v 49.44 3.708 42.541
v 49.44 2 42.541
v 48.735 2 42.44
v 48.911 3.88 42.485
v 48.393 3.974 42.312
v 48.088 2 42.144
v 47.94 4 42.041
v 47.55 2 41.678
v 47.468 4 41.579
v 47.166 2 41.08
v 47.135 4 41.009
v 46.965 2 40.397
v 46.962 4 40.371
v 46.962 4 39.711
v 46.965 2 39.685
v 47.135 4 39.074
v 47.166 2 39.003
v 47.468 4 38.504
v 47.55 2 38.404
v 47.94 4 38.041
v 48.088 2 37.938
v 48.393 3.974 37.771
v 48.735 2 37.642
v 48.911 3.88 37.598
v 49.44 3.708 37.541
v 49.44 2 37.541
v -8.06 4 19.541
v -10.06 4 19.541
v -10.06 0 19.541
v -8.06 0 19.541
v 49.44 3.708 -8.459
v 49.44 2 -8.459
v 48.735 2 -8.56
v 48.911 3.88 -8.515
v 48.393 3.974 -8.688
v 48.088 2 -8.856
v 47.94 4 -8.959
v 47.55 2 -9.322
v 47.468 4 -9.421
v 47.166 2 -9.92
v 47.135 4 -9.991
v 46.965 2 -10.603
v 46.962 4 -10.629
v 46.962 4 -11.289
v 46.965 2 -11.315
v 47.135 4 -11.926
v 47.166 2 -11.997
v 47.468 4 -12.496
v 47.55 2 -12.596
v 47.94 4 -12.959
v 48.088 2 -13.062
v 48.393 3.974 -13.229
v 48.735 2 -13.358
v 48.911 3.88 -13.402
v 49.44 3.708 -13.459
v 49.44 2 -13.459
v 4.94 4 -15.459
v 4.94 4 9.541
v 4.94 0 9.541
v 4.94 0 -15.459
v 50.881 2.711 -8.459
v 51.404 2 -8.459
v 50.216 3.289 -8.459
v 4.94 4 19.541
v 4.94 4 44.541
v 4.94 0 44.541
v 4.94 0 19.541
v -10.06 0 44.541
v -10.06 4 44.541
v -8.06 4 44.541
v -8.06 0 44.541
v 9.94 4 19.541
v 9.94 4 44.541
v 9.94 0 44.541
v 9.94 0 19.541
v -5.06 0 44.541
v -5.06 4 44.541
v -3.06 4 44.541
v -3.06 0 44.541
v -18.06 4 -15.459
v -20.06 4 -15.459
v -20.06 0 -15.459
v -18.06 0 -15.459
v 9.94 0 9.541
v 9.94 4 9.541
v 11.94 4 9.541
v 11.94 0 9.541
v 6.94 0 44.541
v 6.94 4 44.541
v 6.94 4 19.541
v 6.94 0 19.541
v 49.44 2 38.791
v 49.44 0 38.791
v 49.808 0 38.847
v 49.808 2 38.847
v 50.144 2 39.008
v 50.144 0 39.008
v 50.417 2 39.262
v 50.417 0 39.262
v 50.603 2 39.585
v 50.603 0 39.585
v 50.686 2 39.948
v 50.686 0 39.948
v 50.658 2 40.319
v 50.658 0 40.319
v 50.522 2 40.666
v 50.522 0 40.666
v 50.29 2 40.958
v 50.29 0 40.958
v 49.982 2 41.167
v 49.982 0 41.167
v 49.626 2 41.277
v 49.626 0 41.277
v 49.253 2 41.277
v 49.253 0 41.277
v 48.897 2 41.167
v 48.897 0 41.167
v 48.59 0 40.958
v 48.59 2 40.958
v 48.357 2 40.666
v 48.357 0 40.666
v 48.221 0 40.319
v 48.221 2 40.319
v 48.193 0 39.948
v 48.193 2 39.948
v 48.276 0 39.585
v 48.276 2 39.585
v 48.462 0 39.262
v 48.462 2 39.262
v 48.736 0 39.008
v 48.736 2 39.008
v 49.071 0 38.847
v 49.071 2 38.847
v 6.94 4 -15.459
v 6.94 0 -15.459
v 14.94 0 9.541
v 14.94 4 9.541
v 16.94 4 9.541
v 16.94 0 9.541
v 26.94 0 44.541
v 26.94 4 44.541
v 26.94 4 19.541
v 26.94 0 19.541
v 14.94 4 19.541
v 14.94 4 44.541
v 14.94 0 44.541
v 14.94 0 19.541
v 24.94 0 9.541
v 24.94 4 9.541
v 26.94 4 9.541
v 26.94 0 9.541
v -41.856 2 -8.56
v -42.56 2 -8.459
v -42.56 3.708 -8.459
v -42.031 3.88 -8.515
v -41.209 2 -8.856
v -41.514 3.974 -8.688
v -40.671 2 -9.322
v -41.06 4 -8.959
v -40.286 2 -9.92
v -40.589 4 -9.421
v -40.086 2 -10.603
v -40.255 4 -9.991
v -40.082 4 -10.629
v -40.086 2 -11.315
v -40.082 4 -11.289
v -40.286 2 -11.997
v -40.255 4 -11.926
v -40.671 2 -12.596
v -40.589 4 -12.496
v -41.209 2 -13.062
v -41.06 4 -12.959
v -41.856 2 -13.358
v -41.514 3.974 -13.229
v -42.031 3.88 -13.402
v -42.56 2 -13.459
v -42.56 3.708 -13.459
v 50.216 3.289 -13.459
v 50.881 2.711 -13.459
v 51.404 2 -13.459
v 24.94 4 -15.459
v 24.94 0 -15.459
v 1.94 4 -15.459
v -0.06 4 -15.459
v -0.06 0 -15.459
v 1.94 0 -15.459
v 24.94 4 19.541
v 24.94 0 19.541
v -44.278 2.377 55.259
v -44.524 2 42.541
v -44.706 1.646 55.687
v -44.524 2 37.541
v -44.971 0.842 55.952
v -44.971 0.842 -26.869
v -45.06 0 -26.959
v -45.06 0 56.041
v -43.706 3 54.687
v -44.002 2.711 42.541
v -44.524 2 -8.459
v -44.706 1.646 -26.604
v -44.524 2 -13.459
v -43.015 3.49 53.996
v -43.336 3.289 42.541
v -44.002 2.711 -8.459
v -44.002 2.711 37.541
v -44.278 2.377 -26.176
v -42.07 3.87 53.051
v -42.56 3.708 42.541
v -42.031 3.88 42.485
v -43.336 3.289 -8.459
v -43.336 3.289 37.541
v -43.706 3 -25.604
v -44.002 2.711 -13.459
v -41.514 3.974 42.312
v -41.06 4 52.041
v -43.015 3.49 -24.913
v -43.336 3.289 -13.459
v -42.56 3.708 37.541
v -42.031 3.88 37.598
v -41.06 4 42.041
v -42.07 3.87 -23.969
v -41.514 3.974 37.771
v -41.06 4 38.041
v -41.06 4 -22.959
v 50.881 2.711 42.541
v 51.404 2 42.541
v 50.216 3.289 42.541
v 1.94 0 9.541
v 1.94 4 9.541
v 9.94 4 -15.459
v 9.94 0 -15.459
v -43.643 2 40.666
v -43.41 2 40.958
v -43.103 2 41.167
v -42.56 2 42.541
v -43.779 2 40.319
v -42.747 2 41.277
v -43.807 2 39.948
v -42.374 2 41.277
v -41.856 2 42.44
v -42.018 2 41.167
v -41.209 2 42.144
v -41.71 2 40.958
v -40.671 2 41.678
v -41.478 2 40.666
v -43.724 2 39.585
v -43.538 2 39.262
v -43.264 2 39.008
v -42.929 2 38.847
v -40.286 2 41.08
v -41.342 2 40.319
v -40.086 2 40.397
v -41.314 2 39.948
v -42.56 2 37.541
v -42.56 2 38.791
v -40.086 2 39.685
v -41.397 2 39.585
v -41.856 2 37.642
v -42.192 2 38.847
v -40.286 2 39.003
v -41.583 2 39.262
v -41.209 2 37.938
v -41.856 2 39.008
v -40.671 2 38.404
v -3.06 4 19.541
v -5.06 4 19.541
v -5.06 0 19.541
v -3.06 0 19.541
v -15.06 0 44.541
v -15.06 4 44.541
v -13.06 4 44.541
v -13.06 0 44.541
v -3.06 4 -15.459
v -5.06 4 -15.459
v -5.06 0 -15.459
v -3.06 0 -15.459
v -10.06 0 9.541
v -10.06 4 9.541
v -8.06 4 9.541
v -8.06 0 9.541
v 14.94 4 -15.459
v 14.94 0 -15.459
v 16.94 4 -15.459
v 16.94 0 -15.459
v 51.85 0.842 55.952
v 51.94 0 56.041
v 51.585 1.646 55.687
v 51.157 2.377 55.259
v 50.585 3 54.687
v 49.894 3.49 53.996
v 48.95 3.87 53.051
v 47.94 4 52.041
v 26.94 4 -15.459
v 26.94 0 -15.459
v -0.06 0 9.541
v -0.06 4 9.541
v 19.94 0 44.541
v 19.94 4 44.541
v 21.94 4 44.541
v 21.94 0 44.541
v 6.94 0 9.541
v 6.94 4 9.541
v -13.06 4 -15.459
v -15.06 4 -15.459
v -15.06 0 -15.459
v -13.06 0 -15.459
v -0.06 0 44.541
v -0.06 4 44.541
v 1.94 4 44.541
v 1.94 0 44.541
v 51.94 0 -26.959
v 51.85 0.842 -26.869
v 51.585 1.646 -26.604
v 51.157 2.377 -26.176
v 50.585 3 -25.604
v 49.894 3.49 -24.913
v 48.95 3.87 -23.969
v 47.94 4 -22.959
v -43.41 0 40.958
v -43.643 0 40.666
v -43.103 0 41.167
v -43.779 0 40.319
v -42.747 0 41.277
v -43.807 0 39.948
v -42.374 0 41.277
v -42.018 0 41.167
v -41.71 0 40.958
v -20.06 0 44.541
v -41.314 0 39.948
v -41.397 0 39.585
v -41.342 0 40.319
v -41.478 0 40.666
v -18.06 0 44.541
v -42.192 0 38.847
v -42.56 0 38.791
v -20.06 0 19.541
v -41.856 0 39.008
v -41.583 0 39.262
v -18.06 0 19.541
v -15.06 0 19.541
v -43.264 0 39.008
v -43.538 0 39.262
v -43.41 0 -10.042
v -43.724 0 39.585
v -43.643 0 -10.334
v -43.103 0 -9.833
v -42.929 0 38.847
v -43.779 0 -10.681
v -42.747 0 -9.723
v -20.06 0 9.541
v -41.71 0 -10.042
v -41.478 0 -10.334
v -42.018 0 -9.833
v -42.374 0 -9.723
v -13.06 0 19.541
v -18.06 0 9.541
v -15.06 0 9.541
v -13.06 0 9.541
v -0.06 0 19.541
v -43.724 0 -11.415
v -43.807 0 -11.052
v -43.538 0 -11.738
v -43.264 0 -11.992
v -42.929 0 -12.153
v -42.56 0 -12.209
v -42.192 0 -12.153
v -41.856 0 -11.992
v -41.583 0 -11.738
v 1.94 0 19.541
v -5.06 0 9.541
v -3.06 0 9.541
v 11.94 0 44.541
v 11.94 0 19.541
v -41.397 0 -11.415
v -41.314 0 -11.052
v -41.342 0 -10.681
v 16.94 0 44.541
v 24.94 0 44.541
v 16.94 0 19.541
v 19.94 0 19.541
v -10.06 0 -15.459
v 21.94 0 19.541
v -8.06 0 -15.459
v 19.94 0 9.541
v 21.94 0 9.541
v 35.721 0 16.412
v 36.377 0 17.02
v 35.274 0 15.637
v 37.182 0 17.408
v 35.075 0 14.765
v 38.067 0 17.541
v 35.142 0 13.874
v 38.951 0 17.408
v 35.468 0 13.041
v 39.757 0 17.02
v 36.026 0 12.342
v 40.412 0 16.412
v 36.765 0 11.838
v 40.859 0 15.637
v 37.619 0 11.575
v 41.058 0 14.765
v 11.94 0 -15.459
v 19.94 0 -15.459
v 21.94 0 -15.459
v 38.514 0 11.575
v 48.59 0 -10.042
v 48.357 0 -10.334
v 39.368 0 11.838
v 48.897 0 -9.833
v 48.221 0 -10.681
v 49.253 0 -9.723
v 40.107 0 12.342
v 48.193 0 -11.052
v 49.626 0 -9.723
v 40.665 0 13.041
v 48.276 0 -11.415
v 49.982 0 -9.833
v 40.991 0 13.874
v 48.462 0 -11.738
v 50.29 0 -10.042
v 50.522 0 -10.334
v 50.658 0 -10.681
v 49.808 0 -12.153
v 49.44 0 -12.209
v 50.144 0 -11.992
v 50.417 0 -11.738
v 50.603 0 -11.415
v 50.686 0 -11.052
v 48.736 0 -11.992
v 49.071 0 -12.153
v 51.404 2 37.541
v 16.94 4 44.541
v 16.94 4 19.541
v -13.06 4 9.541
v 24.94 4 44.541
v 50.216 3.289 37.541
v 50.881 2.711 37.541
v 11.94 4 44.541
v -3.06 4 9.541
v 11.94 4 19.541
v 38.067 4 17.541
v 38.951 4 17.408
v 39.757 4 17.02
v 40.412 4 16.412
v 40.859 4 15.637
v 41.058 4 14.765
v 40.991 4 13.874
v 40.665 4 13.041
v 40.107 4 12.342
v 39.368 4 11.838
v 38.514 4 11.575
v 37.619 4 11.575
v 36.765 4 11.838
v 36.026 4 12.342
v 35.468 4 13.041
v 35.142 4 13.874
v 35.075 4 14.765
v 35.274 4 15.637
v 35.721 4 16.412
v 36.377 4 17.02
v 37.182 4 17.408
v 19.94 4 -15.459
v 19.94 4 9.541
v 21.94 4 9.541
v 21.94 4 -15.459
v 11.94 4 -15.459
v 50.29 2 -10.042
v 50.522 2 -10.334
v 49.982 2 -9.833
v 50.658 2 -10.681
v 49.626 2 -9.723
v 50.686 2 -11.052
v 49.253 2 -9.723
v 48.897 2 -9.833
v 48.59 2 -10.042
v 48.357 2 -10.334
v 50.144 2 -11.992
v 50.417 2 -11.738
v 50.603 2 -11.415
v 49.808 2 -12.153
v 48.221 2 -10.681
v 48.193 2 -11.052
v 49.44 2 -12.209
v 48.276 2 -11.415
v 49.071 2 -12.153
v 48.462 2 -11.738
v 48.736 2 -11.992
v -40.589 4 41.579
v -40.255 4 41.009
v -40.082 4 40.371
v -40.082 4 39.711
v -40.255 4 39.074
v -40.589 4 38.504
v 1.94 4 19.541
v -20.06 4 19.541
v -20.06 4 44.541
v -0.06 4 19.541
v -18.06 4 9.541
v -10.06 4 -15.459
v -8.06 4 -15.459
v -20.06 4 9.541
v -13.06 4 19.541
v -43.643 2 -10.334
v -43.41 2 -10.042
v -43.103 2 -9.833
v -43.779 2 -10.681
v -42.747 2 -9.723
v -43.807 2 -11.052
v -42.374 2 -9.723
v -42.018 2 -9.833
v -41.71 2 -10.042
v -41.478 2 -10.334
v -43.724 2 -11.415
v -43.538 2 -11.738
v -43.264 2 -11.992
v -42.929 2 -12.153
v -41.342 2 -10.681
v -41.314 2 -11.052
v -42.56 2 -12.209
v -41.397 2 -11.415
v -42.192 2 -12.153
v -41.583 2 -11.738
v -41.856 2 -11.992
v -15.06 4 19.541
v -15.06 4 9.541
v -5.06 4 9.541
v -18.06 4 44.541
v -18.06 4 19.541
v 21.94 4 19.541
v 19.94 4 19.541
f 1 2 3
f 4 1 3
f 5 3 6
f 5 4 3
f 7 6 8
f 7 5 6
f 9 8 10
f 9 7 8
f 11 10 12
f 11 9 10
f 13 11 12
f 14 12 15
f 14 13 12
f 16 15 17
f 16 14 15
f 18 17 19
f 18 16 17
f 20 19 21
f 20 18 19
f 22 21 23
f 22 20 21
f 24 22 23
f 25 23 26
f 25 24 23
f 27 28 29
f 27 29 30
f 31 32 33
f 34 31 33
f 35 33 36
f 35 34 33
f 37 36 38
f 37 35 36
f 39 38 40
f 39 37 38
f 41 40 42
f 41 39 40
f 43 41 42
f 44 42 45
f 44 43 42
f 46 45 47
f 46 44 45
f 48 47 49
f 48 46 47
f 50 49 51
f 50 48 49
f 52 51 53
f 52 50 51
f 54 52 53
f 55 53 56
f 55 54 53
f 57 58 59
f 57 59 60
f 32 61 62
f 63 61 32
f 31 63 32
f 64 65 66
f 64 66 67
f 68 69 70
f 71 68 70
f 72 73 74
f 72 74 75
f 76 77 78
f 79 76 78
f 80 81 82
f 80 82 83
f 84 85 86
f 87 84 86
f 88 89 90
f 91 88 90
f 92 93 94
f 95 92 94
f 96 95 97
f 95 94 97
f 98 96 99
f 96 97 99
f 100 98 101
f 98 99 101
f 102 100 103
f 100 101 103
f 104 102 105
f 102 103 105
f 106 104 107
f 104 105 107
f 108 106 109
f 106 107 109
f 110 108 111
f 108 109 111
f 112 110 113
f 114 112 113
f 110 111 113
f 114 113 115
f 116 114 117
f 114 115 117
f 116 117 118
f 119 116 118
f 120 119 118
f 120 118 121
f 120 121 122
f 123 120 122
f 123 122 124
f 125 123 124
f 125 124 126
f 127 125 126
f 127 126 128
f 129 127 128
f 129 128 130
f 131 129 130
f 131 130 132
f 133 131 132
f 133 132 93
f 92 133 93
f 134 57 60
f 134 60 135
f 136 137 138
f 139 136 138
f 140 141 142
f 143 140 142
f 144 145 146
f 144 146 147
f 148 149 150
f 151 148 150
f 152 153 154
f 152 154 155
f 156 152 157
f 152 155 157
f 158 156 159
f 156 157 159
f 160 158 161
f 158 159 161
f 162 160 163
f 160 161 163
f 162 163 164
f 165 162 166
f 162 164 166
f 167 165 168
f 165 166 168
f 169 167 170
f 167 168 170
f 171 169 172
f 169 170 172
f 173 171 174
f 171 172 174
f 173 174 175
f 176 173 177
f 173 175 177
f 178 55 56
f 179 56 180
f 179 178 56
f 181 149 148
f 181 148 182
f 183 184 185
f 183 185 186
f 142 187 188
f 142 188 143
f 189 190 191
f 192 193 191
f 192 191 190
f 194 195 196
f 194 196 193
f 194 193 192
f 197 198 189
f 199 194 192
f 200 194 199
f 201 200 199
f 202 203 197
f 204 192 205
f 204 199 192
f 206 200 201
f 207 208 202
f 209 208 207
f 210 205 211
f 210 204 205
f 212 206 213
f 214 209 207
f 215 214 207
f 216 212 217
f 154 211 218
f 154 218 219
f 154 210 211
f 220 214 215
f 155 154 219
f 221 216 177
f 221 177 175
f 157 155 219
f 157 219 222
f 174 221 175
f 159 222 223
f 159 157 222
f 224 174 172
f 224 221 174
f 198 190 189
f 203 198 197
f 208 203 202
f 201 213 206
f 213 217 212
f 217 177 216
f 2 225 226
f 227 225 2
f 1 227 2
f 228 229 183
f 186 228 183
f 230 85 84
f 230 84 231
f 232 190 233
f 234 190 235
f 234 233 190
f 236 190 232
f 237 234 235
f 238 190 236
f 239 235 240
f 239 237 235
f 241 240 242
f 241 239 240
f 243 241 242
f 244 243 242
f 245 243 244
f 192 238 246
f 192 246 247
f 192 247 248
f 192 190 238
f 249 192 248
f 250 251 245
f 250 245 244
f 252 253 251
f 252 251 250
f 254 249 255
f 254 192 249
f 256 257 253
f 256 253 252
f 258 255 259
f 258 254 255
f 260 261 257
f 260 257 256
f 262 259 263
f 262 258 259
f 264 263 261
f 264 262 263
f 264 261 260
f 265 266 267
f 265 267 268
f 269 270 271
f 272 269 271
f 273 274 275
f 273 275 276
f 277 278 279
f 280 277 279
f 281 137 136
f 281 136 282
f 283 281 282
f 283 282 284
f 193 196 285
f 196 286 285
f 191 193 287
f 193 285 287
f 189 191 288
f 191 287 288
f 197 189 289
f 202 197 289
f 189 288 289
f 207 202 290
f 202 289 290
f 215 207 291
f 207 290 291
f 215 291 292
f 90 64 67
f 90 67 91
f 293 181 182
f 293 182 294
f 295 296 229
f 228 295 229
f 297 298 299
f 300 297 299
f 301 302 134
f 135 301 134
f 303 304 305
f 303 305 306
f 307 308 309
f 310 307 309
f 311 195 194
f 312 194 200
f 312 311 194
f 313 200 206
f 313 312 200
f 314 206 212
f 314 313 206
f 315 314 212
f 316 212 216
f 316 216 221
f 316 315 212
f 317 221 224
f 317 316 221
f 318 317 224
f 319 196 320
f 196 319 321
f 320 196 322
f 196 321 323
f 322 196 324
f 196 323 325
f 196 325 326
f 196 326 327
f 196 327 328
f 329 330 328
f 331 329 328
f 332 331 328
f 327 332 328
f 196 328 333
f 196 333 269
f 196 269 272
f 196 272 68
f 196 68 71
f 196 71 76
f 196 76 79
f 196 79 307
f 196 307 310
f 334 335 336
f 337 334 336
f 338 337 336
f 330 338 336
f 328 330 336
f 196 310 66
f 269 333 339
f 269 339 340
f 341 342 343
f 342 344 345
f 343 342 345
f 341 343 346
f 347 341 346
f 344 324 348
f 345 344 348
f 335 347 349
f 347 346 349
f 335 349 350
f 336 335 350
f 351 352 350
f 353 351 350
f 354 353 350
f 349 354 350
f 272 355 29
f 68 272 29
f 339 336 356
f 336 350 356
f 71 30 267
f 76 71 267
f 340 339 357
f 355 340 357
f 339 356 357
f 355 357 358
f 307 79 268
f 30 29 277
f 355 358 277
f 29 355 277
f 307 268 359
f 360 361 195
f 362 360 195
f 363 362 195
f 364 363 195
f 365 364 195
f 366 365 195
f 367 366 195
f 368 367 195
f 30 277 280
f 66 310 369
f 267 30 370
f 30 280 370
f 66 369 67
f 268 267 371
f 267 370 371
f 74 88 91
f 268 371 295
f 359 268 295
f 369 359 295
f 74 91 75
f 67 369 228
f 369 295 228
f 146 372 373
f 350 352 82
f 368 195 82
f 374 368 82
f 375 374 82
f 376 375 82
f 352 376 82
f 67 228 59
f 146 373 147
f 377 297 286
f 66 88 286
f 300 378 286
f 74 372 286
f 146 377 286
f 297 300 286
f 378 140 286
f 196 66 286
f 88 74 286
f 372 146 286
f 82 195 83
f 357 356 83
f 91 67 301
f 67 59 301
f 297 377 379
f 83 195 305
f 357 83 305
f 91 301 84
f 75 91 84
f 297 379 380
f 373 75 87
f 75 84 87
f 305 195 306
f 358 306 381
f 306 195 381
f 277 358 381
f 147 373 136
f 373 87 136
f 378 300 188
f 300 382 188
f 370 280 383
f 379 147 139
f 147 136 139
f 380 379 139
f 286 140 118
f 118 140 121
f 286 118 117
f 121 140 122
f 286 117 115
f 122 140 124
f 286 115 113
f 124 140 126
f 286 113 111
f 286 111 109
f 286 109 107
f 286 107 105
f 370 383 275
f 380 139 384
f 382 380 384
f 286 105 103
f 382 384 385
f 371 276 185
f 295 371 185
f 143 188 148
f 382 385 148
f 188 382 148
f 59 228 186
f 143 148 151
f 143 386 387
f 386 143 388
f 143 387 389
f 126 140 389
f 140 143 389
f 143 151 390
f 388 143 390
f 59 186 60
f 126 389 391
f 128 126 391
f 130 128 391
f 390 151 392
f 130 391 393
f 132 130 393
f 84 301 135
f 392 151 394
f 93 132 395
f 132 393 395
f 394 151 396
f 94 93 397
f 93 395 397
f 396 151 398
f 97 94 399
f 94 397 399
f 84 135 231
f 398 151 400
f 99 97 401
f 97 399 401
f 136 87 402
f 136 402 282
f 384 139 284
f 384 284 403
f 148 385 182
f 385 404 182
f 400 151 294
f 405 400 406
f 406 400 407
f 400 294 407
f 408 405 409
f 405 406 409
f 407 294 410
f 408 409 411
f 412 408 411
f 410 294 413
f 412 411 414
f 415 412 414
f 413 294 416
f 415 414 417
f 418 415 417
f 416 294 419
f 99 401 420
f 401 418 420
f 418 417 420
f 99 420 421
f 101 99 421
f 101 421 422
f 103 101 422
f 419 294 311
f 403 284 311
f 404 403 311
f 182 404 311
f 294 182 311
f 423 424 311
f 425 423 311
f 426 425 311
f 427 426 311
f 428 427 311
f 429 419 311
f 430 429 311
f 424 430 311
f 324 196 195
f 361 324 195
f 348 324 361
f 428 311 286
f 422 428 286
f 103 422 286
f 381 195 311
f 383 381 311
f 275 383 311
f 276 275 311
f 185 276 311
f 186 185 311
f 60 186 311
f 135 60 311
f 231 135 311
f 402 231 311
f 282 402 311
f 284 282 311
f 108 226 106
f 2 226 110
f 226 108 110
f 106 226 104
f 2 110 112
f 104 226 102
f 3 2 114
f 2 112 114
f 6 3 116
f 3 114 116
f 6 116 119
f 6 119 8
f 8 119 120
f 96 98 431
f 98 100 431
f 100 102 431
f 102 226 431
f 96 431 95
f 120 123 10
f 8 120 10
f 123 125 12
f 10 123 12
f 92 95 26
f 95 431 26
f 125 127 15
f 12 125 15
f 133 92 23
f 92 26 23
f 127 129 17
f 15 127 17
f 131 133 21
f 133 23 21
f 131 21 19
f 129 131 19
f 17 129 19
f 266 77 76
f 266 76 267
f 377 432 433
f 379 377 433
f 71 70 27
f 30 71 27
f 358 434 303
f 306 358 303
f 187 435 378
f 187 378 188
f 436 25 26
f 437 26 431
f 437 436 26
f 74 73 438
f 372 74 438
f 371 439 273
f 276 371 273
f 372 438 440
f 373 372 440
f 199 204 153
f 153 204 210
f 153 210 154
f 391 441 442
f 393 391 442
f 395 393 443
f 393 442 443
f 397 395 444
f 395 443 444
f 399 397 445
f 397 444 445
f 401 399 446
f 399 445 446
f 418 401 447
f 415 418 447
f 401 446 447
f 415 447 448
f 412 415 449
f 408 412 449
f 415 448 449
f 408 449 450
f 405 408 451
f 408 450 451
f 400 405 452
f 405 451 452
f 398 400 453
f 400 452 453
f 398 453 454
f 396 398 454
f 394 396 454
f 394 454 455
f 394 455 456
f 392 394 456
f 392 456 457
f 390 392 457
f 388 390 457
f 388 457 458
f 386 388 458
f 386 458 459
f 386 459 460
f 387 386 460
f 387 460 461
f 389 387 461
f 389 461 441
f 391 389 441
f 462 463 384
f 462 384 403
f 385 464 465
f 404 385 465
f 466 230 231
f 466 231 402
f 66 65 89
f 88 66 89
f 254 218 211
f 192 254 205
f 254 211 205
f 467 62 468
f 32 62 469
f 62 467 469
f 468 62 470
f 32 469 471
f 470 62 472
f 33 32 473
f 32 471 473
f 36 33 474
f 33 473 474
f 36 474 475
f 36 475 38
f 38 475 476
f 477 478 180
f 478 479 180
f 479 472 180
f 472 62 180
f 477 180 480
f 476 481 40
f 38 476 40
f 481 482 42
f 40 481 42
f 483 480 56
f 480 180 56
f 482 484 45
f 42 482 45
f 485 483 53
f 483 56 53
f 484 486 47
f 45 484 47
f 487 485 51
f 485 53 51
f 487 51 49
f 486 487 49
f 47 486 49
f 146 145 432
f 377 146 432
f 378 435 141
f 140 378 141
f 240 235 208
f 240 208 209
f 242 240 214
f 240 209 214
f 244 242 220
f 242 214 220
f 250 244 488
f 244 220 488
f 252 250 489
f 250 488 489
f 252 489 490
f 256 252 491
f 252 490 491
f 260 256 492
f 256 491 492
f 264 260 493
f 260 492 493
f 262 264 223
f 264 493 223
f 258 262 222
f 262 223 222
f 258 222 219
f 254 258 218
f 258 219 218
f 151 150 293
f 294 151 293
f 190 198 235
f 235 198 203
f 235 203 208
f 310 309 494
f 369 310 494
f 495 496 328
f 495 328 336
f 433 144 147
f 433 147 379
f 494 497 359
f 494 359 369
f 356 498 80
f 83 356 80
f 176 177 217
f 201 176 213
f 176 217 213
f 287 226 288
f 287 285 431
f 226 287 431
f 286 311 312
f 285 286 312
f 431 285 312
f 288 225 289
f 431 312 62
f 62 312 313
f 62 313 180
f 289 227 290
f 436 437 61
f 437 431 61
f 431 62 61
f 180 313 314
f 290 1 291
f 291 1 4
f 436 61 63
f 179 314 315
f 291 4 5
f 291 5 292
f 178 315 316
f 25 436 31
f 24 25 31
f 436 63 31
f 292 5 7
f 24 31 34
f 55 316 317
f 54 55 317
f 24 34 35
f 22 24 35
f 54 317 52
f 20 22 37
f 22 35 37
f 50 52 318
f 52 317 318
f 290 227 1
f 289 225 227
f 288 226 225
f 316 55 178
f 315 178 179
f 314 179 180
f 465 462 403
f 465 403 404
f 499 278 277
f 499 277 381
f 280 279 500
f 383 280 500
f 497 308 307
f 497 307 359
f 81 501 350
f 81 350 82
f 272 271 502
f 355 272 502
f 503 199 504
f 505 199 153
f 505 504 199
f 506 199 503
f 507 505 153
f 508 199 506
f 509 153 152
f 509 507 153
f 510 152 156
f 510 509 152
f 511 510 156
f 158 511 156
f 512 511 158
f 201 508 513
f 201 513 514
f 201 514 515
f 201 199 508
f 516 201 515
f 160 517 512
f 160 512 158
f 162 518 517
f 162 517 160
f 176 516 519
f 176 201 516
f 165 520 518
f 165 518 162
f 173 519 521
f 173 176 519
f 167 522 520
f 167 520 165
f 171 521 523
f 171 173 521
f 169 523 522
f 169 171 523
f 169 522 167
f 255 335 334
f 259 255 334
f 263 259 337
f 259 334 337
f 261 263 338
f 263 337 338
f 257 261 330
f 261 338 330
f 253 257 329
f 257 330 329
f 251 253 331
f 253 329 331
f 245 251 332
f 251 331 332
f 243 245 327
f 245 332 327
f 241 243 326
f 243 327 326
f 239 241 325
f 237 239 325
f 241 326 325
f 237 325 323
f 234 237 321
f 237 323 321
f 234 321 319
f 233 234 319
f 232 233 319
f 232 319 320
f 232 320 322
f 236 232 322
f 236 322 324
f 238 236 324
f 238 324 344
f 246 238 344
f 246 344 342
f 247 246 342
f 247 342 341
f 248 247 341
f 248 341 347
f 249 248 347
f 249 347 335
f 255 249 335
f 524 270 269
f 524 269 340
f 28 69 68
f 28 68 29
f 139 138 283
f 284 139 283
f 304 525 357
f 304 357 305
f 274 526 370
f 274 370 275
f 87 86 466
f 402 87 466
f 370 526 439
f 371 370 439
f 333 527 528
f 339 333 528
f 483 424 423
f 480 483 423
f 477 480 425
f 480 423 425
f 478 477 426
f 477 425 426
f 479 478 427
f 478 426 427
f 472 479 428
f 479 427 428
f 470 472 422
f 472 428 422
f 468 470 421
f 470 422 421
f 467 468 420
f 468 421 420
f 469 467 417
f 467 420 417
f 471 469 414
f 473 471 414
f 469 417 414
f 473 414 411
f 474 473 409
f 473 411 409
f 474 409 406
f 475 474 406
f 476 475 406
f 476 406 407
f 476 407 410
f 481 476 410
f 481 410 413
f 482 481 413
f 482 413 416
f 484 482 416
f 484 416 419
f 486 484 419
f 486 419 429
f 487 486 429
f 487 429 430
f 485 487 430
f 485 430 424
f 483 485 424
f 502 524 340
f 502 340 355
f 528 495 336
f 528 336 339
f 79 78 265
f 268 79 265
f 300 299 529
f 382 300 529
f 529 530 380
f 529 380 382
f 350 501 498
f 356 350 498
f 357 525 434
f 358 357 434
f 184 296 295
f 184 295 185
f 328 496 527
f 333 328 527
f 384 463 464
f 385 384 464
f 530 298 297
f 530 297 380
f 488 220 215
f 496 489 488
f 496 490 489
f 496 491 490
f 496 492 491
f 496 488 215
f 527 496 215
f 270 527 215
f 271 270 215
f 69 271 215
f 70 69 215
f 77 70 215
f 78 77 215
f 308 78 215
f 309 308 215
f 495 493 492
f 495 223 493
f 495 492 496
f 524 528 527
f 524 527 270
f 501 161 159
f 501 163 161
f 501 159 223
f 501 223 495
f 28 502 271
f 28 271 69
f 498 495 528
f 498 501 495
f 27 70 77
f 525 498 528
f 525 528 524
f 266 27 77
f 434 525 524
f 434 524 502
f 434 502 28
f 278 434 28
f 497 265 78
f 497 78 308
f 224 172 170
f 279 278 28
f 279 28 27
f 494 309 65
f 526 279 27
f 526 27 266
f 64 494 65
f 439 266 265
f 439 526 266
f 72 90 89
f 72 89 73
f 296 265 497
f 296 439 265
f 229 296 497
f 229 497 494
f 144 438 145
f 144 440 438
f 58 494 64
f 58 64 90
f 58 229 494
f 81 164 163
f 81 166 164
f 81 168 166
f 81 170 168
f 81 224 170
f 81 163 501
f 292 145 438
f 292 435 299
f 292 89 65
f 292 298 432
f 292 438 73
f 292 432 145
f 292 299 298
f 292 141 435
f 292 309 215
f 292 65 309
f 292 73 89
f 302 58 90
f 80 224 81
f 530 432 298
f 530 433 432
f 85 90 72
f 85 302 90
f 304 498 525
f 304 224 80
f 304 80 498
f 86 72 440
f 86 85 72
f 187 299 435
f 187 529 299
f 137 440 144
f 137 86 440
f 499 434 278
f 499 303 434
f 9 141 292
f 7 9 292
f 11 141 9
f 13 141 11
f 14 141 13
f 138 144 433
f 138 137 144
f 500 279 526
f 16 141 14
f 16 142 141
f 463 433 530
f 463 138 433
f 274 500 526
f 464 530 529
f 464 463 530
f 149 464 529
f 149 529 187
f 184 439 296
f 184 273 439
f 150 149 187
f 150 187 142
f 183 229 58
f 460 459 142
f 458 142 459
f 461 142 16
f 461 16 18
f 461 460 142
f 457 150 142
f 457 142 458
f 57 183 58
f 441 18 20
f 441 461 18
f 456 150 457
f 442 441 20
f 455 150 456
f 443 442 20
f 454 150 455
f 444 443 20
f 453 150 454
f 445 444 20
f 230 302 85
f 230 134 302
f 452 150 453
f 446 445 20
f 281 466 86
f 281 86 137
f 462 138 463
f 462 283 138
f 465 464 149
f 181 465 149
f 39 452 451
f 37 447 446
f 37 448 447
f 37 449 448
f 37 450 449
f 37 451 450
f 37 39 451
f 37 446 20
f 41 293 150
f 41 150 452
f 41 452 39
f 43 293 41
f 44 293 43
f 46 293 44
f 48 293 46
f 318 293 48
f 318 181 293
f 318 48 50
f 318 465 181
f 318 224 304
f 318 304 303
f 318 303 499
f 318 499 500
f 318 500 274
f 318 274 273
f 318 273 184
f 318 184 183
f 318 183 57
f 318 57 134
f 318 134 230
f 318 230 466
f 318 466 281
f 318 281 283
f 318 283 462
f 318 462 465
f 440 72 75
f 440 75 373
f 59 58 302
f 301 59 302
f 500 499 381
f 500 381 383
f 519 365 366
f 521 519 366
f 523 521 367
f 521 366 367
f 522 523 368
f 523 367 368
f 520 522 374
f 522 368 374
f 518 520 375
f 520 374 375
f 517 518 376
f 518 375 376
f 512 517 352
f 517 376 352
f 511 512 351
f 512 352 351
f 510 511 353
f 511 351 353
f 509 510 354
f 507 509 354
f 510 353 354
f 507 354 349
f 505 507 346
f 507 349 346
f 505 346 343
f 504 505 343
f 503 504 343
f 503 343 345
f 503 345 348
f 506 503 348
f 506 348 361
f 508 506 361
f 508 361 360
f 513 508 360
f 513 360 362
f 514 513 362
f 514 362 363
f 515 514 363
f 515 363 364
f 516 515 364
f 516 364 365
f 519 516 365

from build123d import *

# Parameters (mm, degrees)
SKETCH1_W           = 97
SKETCH1_H           = 83
BOSS_EXTRUDE1_DEPTH = 4
FILLET1_R           = 4
SKETCH3_R           = 1.25
CUT_EXTRUDE1_DEPTH  = 10
CUT_EXTRUDE2_DEPTH  = 2
SKETCH5_W           = 2
SKETCH5_H           = 25
CUT_EXTRUDE3_DEPTH  = 10
LPATTERN1_COUNT     = 10
LPATTERN1_PITCH     = 5
SKETCH6_R           = 3
CUT_EXTRUDE4_DEPTH  = 105


with BuildPart() as part:
    # Sketch1 → Boss-Extrude1 (new body)
    with BuildSketch(Plane(origin=(0, 0, 0), x_dir=(1, 0, 0), z_dir=(0, 1, 0))):
        with Locations((3.439716312, -14.541223404)):
            Rectangle(SKETCH1_W, SKETCH1_H)
    extrude(amount=BOSS_EXTRUDE1_DEPTH)

    # Fillet1
    fillet1_edges = [part.edges().sort_by_distance(p)[0] for p in [
        (3.439716312, 4, -26.958776596),
        (51.939716312, 4, 14.541223404),
        (3.439716312, 4, 56.041223404),
        (-45.060283688, 4, 14.541223404),
    ]]
    fillet(fillet1_edges, radius=FILLET1_R - 0.0001)  # a hair under: the kernel refuses the full size

    # Sketch3 → Cut-Extrude1 (cut)
    with BuildSketch(Plane.XZ):
        with Locations(Location((-42.560283688, 40.041223404, 0), (0, 0, 270))):
            Circle(SKETCH3_R)
        with Locations(Location((49.439716312, 40.041223404, 0), (0, 0, 270))):
            Circle(SKETCH3_R)
        with Locations(Location((-42.560283688, -10.958776596, 0), (0, 0, 270))):
            Circle(SKETCH3_R)
        with Locations(Location((49.439716312, -10.958776596, 0), (0, 0, 270))):
            Circle(SKETCH3_R)
    extrude(amount=-CUT_EXTRUDE1_DEPTH, mode=Mode.SUBTRACT)

    # Sketch4 → Cut-Extrude2 (cut)
    with BuildSketch(Plane(origin=(0, 4, 0), x_dir=(1, 0, 0), z_dir=(0, 1, 0))):
        with BuildLine():
            Line((-42.560283688, 13.458776596), (-49.206472021, 13.458776596))
            Line((-49.206472021, 13.458776596), (-49.206472021, 8.458776596))
            Line((-49.206472021, 8.458776596), (-42.560283688, 8.458776596))
            ThreePointArc((-42.560283688, 8.458776596), (-40.060283688, 10.958776596), (-42.560283688, 13.458776596))
        make_face()
        with BuildLine():
            Line((-42.560283688, -37.541223404), (-49.554151242, -37.541223404))
            Line((-49.554151242, -37.541223404), (-49.554151242, -42.541223404))
            Line((-49.554151242, -42.541223404), (-42.560283688, -42.541223404))
            ThreePointArc((-42.560283688, -42.541223404), (-40.060283688, -40.041223404), (-42.560283688, -37.541223404))
        make_face()
        with BuildLine():
            Line((49.439716312, 13.458776596), (53.973660089, 13.458776596))
            Line((53.973660089, 13.458776596), (53.973660089, 8.458776596))
            Line((53.973660089, 8.458776596), (49.439716312, 8.458776596))
            ThreePointArc((49.439716312, 8.458776596), (46.939716312, 10.958776596), (49.439716312, 13.458776596))
        make_face()
        with BuildLine():
            Line((49.439716312, -37.541223404), (55.815990307, -37.541223404))
            Line((55.815990307, -37.541223404), (55.815990307, -42.541223404))
            Line((55.815990307, -42.541223404), (49.439716312, -42.541223404))
            ThreePointArc((49.439716312, -42.541223404), (46.939716312, -40.041223404), (49.439716312, -37.541223404))
        make_face()
    extrude(amount=-CUT_EXTRUDE2_DEPTH, mode=Mode.SUBTRACT)

    # Sketch5 → Cut-Extrude3 (cut)
    with BuildSketch(Plane(origin=(0, 4, 0), x_dir=(1, 0, 0), z_dir=(0, 1, 0))):
        with Locations((-19.060283688, 2.958776596)):
            Rectangle(SKETCH5_W, SKETCH5_H)
        with Locations((-19.060283688, -32.041223404)):
            Rectangle(SKETCH5_W, SKETCH5_H)
    cut_extrude3 = extrude(amount=-CUT_EXTRUDE3_DEPTH, mode=Mode.SUBTRACT)

    # LPattern1: Cut-Extrude3 ×10
    with Locations(*[(i * LPATTERN1_PITCH, 0, 0) for i in range(1, LPATTERN1_COUNT)]):
        add(cut_extrude3, mode=Mode.SUBTRACT)

    # Sketch6 → Cut-Extrude4 (cut)
    with BuildSketch(Plane(origin=(0, 4, 0), x_dir=(1, 0, 0), z_dir=(0, 1, 0))):
        with Locations(Location((38.066563645, -14.541223404, 0), (0, 0, 270))):
            Circle(SKETCH6_R)
    extrude(amount=-CUT_EXTRUDE4_DEPTH, mode=Mode.SUBTRACT)


solid = part.part
